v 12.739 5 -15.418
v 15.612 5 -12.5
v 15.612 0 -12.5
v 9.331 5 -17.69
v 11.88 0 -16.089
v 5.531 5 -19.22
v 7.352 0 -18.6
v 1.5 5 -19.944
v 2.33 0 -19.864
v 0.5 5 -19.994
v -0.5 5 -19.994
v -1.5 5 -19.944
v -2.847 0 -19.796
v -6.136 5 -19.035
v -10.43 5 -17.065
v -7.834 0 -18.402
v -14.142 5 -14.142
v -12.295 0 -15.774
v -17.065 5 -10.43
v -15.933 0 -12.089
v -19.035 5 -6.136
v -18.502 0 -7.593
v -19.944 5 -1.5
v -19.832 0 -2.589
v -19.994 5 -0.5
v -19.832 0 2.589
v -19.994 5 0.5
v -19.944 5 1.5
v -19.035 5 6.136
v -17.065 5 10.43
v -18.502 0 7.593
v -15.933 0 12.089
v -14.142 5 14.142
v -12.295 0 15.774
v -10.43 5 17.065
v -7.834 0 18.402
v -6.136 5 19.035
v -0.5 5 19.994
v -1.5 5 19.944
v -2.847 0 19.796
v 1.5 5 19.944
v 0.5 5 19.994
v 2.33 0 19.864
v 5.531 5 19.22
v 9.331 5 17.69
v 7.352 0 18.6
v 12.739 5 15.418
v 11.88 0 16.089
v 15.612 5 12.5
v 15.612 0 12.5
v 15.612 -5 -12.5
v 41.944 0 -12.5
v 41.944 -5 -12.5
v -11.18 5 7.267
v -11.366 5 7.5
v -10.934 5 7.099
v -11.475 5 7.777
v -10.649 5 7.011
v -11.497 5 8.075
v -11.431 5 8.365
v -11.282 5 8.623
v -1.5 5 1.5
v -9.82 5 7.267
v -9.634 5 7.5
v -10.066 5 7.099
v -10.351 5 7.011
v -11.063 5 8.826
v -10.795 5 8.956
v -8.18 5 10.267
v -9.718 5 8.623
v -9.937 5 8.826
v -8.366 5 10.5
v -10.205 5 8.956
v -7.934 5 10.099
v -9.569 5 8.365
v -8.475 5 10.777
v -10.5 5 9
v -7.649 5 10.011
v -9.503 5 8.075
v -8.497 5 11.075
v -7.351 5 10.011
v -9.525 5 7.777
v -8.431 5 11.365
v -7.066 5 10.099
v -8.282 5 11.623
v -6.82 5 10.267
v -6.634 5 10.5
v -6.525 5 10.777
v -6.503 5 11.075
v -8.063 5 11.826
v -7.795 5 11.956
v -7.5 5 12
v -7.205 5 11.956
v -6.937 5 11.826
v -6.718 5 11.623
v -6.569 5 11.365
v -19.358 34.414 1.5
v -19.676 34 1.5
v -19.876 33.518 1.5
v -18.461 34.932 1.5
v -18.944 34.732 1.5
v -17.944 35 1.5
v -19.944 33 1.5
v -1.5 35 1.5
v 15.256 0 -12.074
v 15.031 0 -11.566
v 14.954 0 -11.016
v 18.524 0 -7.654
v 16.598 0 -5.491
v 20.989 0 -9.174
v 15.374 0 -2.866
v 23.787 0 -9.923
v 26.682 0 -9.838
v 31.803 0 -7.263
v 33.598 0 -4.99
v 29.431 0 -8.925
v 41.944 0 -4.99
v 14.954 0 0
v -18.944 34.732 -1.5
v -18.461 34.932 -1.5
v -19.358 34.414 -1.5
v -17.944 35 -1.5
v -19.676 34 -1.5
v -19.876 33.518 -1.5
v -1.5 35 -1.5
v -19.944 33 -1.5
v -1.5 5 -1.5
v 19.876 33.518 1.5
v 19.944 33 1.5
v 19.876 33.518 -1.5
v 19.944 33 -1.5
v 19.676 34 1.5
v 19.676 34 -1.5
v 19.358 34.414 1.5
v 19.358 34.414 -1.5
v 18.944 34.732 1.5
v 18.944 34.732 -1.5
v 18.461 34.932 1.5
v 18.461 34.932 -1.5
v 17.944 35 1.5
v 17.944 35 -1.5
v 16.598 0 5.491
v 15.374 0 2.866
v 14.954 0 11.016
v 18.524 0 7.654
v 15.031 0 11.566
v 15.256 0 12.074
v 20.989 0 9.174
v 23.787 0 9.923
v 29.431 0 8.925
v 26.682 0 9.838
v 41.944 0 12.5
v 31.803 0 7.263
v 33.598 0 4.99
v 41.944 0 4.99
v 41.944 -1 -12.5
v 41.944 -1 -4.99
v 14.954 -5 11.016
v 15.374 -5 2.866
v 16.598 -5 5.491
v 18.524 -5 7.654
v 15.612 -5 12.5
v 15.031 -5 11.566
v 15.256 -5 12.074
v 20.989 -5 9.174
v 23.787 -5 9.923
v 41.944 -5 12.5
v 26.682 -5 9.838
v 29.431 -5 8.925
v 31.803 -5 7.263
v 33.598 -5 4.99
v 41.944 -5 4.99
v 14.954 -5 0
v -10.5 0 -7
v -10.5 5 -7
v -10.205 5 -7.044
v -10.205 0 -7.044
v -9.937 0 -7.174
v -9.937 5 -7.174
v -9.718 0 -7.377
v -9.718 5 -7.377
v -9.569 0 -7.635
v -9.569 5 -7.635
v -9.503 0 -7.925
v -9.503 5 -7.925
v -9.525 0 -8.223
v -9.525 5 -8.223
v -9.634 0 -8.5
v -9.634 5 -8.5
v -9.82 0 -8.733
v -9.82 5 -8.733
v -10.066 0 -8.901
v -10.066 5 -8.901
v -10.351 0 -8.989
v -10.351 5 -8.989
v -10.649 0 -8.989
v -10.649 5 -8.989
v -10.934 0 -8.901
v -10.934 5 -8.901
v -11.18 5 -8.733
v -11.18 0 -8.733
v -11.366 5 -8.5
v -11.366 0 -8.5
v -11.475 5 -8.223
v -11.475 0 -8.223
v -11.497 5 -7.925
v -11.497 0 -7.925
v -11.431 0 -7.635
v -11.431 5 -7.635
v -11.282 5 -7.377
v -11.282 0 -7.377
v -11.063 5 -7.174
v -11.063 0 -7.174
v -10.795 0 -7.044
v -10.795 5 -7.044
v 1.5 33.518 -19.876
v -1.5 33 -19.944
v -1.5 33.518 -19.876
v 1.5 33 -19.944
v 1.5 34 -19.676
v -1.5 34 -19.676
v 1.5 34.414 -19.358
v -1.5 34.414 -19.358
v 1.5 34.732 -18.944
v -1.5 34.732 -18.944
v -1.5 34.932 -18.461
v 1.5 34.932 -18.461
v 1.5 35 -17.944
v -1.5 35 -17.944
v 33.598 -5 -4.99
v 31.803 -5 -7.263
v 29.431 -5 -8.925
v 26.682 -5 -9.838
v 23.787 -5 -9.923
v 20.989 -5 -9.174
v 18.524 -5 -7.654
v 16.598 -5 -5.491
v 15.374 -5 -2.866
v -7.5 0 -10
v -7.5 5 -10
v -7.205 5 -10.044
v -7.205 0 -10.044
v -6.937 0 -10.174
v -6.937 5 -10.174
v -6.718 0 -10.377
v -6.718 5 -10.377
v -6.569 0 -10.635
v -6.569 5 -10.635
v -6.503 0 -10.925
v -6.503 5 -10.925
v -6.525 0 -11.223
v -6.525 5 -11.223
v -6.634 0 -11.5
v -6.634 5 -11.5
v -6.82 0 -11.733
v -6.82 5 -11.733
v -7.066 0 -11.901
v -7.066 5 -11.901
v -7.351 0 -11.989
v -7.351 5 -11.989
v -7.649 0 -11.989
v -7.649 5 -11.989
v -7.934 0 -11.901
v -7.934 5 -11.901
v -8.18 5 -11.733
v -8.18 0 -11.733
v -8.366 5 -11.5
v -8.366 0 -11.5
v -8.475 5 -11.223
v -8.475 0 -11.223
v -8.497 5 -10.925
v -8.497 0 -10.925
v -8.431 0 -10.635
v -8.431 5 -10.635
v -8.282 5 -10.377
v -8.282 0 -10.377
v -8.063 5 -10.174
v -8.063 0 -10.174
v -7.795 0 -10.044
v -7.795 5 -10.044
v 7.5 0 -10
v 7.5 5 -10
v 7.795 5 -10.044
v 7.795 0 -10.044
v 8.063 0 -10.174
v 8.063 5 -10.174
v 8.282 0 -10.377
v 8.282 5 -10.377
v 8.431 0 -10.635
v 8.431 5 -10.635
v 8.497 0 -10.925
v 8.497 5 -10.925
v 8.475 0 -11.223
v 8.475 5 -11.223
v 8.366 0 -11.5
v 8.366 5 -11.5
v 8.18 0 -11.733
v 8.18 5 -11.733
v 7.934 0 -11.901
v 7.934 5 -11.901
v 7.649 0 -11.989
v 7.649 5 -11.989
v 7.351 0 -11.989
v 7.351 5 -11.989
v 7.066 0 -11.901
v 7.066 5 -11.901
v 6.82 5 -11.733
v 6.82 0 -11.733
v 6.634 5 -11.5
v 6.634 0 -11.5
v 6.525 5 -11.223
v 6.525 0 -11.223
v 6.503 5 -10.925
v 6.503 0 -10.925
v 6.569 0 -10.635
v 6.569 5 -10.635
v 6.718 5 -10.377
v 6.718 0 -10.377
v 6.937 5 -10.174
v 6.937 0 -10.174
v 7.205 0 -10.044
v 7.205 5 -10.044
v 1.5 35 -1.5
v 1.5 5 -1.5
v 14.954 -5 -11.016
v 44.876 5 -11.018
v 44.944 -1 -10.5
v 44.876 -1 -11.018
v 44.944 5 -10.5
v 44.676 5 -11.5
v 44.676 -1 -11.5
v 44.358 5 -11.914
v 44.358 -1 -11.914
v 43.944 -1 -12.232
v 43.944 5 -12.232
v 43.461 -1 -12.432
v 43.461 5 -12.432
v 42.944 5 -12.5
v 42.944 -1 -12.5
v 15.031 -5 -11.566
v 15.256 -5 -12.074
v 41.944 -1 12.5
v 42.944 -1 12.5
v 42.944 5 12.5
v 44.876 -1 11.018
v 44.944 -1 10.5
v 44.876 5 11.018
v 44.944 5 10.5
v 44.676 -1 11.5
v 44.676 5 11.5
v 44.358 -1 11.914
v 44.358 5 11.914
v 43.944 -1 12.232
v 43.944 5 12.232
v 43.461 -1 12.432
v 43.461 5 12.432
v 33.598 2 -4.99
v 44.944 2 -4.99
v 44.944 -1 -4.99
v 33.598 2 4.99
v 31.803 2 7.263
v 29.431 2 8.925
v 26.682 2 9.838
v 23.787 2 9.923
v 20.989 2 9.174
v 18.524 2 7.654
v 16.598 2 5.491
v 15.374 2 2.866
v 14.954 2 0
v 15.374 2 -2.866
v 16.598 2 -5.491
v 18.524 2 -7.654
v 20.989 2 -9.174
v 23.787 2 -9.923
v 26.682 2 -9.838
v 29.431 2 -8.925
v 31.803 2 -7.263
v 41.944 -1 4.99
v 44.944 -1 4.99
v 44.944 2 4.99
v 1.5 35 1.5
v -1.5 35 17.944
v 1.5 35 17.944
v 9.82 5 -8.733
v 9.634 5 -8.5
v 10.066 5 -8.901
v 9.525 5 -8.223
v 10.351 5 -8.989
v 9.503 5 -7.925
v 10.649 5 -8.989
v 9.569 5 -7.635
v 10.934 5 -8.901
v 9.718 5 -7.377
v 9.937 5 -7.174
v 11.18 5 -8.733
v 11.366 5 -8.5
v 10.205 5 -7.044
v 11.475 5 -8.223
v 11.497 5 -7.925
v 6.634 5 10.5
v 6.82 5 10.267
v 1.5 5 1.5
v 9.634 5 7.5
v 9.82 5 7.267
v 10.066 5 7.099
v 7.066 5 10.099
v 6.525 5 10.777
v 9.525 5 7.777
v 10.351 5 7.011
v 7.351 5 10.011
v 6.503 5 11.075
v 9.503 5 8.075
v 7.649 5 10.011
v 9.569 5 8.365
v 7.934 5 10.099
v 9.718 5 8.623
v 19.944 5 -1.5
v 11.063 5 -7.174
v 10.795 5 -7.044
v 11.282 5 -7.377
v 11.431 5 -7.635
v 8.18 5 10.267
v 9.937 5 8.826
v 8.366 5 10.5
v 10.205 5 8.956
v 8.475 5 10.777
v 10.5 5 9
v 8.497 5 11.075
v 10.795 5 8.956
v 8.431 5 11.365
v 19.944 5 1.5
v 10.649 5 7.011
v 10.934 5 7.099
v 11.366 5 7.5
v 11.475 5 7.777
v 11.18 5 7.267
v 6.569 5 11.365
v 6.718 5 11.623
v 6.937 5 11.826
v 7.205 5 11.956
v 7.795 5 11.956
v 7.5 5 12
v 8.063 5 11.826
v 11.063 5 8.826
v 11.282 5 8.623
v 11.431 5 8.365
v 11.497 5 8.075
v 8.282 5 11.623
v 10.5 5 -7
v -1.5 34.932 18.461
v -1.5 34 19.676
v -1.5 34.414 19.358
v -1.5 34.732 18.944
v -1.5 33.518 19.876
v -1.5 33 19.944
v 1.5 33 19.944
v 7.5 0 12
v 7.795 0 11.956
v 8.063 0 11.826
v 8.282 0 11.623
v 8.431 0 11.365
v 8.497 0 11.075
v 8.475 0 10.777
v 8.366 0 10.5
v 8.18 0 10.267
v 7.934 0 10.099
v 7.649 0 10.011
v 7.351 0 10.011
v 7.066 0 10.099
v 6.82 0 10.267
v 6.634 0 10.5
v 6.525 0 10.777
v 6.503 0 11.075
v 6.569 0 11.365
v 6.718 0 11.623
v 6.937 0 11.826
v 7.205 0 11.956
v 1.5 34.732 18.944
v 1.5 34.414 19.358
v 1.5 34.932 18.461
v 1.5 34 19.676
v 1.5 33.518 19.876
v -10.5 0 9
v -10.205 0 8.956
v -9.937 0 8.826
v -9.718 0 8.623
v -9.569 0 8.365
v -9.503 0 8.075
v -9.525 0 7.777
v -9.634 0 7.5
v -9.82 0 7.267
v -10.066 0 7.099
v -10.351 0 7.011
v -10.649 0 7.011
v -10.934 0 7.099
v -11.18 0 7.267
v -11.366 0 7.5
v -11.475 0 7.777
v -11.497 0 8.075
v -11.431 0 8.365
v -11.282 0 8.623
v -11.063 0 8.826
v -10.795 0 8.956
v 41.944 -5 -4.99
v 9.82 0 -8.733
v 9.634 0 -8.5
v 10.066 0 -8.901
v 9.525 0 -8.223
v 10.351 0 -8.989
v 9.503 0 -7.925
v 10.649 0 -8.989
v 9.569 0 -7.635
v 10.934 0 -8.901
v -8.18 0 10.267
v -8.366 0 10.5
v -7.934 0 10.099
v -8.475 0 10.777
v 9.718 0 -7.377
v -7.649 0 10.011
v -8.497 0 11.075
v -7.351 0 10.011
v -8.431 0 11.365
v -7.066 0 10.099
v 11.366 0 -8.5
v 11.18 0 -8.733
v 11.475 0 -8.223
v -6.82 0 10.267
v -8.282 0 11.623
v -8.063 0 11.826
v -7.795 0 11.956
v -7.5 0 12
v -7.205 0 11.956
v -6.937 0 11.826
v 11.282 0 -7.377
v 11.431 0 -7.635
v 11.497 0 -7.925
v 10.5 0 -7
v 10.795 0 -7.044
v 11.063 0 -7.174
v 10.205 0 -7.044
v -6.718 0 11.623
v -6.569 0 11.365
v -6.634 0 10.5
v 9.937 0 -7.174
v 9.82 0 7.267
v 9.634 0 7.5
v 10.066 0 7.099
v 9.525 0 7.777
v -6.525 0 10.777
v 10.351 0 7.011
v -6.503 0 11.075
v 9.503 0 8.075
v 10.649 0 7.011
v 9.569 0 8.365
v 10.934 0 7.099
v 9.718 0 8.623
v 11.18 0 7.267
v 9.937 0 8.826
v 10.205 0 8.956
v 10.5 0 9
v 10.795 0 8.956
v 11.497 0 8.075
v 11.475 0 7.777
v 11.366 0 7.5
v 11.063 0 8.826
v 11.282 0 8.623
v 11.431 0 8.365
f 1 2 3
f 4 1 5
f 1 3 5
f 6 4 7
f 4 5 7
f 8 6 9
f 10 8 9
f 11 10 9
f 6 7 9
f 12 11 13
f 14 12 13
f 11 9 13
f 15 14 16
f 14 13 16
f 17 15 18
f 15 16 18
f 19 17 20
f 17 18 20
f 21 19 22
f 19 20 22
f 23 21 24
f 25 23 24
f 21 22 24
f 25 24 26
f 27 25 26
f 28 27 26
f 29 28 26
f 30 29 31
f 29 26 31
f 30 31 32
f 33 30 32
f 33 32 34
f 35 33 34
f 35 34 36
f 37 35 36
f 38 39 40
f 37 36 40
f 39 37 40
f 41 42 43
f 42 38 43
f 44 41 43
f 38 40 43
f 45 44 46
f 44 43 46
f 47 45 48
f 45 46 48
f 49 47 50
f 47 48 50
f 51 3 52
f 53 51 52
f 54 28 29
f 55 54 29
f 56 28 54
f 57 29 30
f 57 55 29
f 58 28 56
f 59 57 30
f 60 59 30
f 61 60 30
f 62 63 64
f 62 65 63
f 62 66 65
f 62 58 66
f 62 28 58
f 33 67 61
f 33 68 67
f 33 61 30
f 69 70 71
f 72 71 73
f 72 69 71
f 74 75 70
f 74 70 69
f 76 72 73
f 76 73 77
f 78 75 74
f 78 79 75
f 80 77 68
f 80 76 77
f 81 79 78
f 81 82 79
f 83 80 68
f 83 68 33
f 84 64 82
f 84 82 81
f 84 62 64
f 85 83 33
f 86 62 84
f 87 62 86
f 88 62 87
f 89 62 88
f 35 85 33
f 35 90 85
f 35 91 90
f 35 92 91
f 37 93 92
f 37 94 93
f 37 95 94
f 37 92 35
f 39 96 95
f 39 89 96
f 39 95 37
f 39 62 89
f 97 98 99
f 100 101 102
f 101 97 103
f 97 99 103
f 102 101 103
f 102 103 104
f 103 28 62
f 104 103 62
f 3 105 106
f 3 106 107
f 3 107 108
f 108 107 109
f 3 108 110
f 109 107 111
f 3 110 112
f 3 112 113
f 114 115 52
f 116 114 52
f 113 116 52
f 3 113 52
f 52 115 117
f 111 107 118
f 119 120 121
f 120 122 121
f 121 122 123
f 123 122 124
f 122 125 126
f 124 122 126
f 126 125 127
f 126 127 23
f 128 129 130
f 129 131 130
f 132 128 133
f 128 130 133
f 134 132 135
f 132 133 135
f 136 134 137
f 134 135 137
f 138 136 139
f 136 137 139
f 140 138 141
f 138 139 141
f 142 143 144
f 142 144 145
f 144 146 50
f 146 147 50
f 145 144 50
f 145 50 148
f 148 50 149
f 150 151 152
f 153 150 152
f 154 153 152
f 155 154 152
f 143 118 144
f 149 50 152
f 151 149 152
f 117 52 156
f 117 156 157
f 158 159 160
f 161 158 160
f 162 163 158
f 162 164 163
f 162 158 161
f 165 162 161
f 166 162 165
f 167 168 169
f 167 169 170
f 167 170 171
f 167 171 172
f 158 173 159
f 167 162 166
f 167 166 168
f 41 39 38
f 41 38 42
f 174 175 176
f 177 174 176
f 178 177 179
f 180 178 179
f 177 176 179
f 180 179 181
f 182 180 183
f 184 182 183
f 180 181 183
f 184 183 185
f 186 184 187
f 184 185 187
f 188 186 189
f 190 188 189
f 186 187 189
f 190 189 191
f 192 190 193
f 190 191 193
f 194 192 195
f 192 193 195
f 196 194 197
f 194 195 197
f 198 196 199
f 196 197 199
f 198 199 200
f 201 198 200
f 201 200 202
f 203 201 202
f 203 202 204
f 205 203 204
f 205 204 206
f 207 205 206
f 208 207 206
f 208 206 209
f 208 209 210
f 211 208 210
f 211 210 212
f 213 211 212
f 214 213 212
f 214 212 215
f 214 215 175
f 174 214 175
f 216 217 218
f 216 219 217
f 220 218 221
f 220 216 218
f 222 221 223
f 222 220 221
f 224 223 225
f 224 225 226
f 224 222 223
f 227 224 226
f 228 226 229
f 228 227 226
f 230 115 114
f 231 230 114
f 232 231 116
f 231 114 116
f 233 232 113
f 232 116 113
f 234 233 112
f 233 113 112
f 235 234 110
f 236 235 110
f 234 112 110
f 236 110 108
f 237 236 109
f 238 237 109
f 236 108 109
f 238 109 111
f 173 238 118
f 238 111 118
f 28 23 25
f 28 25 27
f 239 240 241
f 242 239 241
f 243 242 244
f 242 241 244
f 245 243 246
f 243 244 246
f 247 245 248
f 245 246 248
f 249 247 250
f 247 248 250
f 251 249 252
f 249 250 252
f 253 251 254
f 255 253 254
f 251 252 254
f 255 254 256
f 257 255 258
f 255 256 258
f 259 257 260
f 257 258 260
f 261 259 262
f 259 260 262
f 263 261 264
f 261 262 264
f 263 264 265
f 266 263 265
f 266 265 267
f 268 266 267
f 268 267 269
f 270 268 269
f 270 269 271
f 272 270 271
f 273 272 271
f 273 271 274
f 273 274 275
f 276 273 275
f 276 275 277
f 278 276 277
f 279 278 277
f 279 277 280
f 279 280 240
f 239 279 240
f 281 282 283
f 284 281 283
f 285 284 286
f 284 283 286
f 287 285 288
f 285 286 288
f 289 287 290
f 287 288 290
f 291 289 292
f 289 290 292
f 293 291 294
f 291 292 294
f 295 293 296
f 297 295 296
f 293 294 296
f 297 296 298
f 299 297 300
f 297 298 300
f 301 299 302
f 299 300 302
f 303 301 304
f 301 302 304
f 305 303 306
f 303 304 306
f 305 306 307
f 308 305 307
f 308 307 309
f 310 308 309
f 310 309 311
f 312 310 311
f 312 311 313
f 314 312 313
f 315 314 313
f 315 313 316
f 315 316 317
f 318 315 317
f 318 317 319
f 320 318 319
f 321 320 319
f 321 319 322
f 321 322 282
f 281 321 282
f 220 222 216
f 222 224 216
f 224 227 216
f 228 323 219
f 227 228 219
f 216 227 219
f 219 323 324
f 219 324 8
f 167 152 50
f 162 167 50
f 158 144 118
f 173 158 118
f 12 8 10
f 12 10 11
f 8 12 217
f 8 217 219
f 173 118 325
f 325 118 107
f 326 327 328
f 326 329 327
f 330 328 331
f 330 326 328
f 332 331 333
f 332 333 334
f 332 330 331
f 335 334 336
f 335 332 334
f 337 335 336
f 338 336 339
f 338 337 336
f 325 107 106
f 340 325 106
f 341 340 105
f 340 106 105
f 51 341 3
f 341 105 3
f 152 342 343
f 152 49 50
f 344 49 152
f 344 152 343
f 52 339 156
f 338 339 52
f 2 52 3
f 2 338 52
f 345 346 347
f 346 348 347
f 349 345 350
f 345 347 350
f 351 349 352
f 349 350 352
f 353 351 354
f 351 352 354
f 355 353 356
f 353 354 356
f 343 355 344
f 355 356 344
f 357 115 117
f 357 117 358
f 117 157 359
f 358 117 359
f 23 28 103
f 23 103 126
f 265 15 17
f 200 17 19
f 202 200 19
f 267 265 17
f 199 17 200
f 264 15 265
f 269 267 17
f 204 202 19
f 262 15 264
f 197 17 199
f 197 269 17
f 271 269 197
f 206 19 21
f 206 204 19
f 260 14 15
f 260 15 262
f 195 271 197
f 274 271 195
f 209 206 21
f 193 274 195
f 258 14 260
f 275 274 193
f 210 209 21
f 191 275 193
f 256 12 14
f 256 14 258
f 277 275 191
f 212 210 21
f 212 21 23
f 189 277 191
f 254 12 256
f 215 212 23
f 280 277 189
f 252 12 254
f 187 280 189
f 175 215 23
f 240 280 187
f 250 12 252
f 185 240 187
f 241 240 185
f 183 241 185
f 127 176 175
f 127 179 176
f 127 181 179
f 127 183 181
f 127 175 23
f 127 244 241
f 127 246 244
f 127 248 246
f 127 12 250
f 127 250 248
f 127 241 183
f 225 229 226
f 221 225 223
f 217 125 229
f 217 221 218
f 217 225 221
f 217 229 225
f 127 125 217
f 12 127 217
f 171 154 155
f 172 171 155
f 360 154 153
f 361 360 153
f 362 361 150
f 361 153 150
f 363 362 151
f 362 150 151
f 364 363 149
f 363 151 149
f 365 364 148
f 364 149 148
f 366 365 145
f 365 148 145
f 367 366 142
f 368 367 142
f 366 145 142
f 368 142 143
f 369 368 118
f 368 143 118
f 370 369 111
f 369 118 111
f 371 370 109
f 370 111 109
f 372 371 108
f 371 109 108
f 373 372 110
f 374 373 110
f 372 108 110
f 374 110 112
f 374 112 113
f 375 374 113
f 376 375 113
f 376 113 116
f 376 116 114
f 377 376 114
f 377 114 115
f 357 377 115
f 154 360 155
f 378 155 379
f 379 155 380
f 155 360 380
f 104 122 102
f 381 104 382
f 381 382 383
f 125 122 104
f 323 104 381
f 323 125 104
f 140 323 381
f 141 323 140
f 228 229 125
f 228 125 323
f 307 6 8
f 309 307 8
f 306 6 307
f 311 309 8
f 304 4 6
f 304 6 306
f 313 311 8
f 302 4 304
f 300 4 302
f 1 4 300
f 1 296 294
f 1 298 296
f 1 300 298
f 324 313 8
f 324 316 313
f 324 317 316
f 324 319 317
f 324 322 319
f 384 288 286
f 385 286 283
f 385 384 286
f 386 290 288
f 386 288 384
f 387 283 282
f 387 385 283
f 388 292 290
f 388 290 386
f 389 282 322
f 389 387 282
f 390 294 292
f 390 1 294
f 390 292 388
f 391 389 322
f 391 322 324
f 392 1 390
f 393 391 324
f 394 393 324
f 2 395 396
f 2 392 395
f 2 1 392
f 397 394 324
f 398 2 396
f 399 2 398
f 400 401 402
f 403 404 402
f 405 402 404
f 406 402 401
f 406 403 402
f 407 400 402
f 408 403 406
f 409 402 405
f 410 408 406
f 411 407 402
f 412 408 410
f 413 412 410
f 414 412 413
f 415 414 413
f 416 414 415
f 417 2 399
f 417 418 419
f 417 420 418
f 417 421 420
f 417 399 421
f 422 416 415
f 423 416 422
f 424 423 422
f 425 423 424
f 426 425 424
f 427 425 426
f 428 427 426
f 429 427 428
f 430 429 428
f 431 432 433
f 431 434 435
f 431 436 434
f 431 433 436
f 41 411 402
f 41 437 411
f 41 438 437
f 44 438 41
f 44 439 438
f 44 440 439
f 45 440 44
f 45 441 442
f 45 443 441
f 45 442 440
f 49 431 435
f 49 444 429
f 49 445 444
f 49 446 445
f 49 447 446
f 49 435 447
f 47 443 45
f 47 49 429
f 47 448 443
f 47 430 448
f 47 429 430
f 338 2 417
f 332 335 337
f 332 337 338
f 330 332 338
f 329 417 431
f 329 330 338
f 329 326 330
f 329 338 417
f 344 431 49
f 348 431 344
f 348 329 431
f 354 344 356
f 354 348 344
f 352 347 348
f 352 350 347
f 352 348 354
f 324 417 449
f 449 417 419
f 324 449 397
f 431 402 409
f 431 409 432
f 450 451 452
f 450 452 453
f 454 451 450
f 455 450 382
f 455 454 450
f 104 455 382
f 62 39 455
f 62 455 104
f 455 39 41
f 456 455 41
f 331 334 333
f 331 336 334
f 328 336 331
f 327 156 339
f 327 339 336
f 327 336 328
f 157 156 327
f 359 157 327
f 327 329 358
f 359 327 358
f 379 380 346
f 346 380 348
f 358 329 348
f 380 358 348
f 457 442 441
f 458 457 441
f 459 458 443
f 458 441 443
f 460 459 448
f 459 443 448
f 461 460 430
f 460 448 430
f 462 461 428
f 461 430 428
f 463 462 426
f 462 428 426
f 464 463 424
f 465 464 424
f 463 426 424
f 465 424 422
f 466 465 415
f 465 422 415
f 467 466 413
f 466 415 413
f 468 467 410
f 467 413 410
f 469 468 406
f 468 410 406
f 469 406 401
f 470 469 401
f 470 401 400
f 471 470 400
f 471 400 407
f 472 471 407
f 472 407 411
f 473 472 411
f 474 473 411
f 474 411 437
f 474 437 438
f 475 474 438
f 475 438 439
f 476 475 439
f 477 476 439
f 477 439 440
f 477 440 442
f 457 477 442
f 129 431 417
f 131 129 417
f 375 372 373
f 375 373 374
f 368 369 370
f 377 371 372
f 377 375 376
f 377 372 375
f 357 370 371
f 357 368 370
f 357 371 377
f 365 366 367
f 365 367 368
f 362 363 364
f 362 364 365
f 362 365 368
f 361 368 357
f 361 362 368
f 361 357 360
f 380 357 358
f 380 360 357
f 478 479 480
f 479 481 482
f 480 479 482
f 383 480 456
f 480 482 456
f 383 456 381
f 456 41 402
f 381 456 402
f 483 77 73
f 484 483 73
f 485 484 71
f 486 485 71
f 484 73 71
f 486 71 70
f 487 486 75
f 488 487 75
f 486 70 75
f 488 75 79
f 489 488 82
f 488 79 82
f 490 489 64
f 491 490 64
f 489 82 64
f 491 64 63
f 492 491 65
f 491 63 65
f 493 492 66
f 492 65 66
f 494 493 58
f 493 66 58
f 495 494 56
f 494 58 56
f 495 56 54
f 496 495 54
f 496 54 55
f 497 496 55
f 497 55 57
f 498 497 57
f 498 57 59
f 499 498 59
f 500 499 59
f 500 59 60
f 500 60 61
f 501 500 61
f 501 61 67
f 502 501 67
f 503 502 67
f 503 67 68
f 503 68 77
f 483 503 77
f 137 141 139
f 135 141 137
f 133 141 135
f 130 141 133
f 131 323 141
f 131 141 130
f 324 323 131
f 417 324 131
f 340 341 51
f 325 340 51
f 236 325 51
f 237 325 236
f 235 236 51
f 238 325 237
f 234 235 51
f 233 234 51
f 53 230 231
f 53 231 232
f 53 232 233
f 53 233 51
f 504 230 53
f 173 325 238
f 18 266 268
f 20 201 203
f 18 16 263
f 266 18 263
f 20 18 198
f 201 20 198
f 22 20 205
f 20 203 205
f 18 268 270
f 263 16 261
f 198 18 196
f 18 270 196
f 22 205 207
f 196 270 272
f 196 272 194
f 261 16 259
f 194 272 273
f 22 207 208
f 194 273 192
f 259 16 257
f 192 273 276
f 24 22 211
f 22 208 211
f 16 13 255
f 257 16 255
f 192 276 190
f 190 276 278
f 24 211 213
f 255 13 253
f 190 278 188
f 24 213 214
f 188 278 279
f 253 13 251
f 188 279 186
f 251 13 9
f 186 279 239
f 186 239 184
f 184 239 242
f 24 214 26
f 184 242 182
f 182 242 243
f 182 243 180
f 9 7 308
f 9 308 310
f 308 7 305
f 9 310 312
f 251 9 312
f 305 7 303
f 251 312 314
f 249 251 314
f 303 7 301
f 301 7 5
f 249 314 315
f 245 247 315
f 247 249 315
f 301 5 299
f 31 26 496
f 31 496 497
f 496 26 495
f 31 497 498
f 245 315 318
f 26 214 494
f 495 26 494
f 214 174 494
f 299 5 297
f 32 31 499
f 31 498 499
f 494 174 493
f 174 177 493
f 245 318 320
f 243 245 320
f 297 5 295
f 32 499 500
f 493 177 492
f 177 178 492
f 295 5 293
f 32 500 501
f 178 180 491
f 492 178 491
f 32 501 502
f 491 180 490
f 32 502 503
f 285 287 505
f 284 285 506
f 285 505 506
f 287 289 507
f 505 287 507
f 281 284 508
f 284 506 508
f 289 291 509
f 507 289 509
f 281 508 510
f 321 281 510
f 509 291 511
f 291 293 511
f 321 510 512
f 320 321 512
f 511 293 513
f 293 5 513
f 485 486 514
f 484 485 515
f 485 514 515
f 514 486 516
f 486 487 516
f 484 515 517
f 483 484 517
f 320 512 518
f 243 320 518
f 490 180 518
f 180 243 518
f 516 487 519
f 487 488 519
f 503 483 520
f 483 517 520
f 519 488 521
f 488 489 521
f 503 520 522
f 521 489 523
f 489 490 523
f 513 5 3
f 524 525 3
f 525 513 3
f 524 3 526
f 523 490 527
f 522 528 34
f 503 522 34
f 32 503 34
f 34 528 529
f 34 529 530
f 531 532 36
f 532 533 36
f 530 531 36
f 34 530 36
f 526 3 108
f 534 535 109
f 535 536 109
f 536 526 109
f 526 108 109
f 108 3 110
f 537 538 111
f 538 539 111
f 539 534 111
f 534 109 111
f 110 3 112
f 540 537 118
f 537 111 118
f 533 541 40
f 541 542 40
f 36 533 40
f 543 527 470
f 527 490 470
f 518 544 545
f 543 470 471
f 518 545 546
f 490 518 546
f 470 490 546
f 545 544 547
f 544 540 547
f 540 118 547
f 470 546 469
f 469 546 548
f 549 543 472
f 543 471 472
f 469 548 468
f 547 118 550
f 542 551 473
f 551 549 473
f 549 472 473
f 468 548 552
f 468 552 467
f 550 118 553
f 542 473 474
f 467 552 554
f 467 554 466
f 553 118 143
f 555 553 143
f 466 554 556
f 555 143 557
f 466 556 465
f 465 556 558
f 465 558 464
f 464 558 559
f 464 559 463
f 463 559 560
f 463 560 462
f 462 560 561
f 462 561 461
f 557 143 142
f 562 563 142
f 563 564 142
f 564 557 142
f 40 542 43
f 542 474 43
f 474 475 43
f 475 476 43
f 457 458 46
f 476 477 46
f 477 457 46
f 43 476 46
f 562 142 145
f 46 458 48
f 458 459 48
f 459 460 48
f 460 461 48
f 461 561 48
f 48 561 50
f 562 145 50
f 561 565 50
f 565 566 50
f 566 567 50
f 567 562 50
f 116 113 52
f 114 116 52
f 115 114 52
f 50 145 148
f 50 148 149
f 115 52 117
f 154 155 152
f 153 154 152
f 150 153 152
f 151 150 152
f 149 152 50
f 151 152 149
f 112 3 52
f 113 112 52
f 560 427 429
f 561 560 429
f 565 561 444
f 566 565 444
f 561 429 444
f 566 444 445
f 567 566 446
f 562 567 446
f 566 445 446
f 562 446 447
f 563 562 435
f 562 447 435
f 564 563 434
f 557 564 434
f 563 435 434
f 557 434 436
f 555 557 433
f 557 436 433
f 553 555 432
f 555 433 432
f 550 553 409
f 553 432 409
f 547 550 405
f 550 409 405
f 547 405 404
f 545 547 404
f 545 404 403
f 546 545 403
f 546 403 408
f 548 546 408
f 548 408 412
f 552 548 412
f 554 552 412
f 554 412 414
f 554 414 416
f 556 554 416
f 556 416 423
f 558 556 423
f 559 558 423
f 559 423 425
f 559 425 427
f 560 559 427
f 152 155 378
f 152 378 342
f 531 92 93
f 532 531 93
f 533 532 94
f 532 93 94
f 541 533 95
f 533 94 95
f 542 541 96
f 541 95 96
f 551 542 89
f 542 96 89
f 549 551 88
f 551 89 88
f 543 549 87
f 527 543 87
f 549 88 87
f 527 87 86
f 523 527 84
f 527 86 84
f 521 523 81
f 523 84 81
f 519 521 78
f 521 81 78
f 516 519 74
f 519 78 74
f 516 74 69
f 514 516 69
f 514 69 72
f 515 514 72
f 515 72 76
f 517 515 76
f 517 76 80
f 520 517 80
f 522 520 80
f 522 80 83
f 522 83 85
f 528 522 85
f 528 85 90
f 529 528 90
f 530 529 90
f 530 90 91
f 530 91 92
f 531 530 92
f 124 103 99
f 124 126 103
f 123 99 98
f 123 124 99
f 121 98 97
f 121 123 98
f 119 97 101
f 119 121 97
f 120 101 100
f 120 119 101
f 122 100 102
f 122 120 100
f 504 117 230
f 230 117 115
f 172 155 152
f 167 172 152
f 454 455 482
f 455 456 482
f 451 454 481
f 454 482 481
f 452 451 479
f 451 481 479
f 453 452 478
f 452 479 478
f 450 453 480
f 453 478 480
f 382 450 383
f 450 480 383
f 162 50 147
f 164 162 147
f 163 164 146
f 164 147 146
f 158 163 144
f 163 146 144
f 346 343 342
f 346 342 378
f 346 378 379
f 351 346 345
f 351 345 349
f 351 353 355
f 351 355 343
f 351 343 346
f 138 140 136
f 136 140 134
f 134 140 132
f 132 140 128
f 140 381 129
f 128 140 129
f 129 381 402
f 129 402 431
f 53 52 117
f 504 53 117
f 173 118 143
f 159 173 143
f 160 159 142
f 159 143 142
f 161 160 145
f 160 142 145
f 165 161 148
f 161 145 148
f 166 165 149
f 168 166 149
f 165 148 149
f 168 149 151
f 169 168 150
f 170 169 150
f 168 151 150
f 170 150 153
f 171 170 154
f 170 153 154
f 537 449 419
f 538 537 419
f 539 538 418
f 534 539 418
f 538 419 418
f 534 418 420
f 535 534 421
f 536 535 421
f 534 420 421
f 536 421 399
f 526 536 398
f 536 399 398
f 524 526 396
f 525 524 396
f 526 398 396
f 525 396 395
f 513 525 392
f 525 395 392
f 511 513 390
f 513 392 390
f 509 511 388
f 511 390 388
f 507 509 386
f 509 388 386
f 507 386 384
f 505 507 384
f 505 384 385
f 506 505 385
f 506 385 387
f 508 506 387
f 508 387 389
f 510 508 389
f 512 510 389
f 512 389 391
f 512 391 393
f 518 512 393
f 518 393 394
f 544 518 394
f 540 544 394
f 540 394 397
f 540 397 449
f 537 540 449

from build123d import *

# Parameters (mm, degrees)
SKETCH1_R             = 20
BOSS_EXTRUDE1_DEPTH   = 5
SKETCH2_W             = 18.443670675
SKETCH2_H             = 3
SKETCH2_W_2           = 3
SKETCH2_H_2           = 18.443670675
BOSS_EXTRUDE2_DEPTH   = 30
BOSS_EXTRUDE3_DEPTH   = 5
CUT_EXTRUDE1_DEPTH    = 2
SKETCH5_R             = 1
CUT_EXTRUDE3_DEPTH    = 58.618864391
FILLET1_R             = 2
SKETCH7_W             = 3
SKETCH7_H             = 7.51
BOSS_EXTRUDE4_DEPTH   = 1
BOSS_EXTRUDE6_DEPTH   = 5
BOSS_EXTRUDE6_2_DEPTH = 5
FILLET2_R             = 2
FILLET3_R             = 2
FILLET4_R             = 2


with BuildPart() as part:
    # Sketch1 → Boss-Extrude1 (new body)
    with BuildSketch(Plane(origin=(0, 0, 0), x_dir=(1, 0, 0), z_dir=(0, 1, 0))):
        with Locations(Location((0, 0, 0), (0, 0, 270))):
            Circle(SKETCH1_R)
    extrude(amount=BOSS_EXTRUDE1_DEPTH)

    # Sketch2 → Boss-Extrude2 (add)
    with BuildSketch(Plane(origin=(0, 5, 0), x_dir=(1, 0, 0), z_dir=(0, 1, 0))):
        with Locations((-10.721835337, 0)):
            Rectangle(SKETCH2_W, SKETCH2_H)
        Rectangle(SKETCH2_W_2, SKETCH2_H)
        with Locations((0, -10.721835337)):
            Rectangle(SKETCH2_W_2, SKETCH2_H_2)
        with Locations((0, 10.721835337)):
            Rectangle(SKETCH2_W_2, SKETCH2_H_2)
        with Locations((10.721835337, 0)):
            Rectangle(SKETCH2_W, SKETCH2_H)
    extrude(amount=BOSS_EXTRUDE2_DEPTH)

    # Sketch3 → Boss-Extrude3 (add)
    with BuildSketch(Plane(origin=(0, 5, 0), x_dir=(1, 0, 0), z_dir=(0, 1, 0))):
        Polygon((-5.056329325, 12.5), (-5.056329325, -12.5), (15.612494996, -12.5), (44.943670675, -12.5), (44.943670675, 12.5), align=None)
    extrude(amount=-BOSS_EXTRUDE3_DEPTH)

    # Sketch4 → Cut-Extrude1 (cut)
    with BuildSketch(Plane.XZ):
        with BuildLine():
            ThreePointArc((33.598149285, 4.99), (14.953670675, 0), (33.598149285, -4.99))
            Line((33.598149285, -4.99), (24.943670675, -4.99))
            Line((24.943670675, -4.99), (24.943670675, 4.99))
            Line((24.943670675, 4.99), (33.598149285, 4.99))
        make_face()
        with BuildLine():
            Line((24.943670675, -4.99), (33.598149285, -4.99))
            ThreePointArc((33.598149285, -4.99), (34.594016299, -2.58281423), (34.933670675, 0))
            ThreePointArc((34.933670675, 0), (34.594016299, 2.58281423), (33.598149285, 4.99))
            Line((33.598149285, 4.99), (24.943670675, 4.99))
            Line((24.943670675, 4.99), (24.943670675, -4.99))
        make_face()
        with BuildLine():
            Line((33.598149285, -4.99), (44.943670675, -4.99))
            Line((44.943670675, -4.99), (44.943670675, 4.99))
            Line((44.943670675, 4.99), (33.598149285, 4.99))
            ThreePointArc((33.598149285, 4.99), (34.594016299, 2.58281423), (34.933670675, 0))
            ThreePointArc((34.933670675, 0), (34.594016299, -2.58281423), (33.598149285, -4.99))
        make_face()
        with BuildLine():
            ThreePointArc((33.598149285, 4.99), (14.953670675, 0), (33.598149285, -4.99))
            Line((33.598149285, -4.99), (24.943670675, -4.99))
            Line((24.943670675, -4.99), (24.943670675, 4.99))
            Line((24.943670675, 4.99), (33.598149285, 4.99))
        make_face()
        with BuildLine():
            Line((24.943670675, -4.99), (33.598149285, -4.99))
            ThreePointArc((33.598149285, -4.99), (34.594016299, -2.58281423), (34.933670675, 0))
            ThreePointArc((34.933670675, 0), (34.594016299, 2.58281423), (33.598149285, 4.99))
            Line((33.598149285, 4.99), (24.943670675, 4.99))
            Line((24.943670675, 4.99), (24.943670675, -4.99))
        make_face()
    extrude(amount=-CUT_EXTRUDE1_DEPTH, mode=Mode.SUBTRACT)

    # Sketch5 → Cut-Extrude3 (cut, through all)
    with BuildSketch(Plane(origin=(0, 5, 0), x_dir=(1, 0, 0), z_dir=(0, 1, 0))):
        with Locations(Location((-10.5, 8, 0), (0, 0, 270))):
            Circle(SKETCH5_R)
        with Locations(Location((-7.5, 11, 0), (0, 0, 270))):
            Circle(SKETCH5_R)
        with Locations(Location((7.5, 11, 0), (0, 0, 270))):
            Circle(SKETCH5_R)
        with Locations(Location((10.5, 8, 0), (0, 0, 270))):
            Circle(SKETCH5_R)
        with Locations(Location((-10.5, -8, 0), (0, 0, 270))):
            Circle(SKETCH5_R)
        with Locations(Location((-7.5, -11, 0), (0, 0, 270))):
            Circle(SKETCH5_R)
        with Locations(Location((10.5, -8, 0), (0, 0, 270))):
            Circle(SKETCH5_R)
        with Locations(Location((7.5, -11, 0), (0, 0, 270))):
            Circle(SKETCH5_R)
    extrude(amount=-CUT_EXTRUDE3_DEPTH, mode=Mode.SUBTRACT)

    # Fillet1
    fillet1_edges = [part.edges().sort_by_distance(p)[0] for p in [
        (19.943670675, 35, 0),
        (0, 35, -19.943670675),
        (-19.943670675, 35, 0),
        (0, 35, 19.943670675),
    ]]
    fillet(fillet1_edges, radius=FILLET1_R)

    # Sketch7 → Boss-Extrude4 (add)
    with BuildSketch(Plane.XZ):
        with Locations((43.443670675, 8.745)):
            Rectangle(SKETCH7_W, SKETCH7_H)
        with Locations((43.443670675, -8.745)):
            Rectangle(SKETCH7_W, SKETCH7_H)
    extrude(amount=BOSS_EXTRUDE4_DEPTH)

    # Fillet4
    fillet4_edges = [part.edges().sort_by_distance(p)[0] for p in [
        (44.943670675, 2, 12.5),
        (44.943670675, 2, -12.5),
    ]]
    fillet(fillet4_edges, radius=FILLET4_R)


with BuildPart() as body_2:
    # Sketch8 → Boss-Extrude6 (new body)
    with BuildSketch(Plane.XZ):
        with BuildLine():
            Line((14.953670675, 13.281104372), (14.953670675, 0))
            ThreePointArc((14.953670675, 0), (22.360856445, 9.650345624), (33.598149285, 4.99))
            Line((33.598149285, 4.99), (41.943670675, 4.99))
            Line((41.943670675, 4.99), (41.943670675, 12.5))
            Line((41.943670675, 12.5), (15.612494996, 12.5))
            ThreePointArc((15.612494996, 12.5), (15.288072212, 12.894760488), (14.953670675, 13.281104372))
        make_face()
    extrude(amount=BOSS_EXTRUDE6_DEPTH)

    # Fillet2
    # the kernel refuses this fillet: 2 mm, written as the material it takes off along each edge
    with BuildSketch(Plane(origin=(14.953670675, 5.661911606, 13.281104372), x_dir=(0, 0, -1), z_dir=(0, -1, 0))) as fillet2_piece_1:
        with BuildLine():
            CenterArc((2.264764642, 2), FILLET2_R, 222.112450768, 47.887549232)
            ThreePointArc((0.781104372, 0.658824321), (0.386343884, 0.334401537), (0, 0))
            Line((0, 0), (2.264764642, 0))
        make_face()
    extrude(amount=16.323823211, mode=Mode.SUBTRACT)


with BuildPart() as body_3:
    # Sketch8 → Boss-Extrude6 2 (new body)
    with BuildSketch(Plane.XZ):
        with BuildLine():
            Line((41.943670675, -4.99), (33.598149285, -4.99))
            ThreePointArc((33.598149285, -4.99), (22.360856445, -9.650345624), (14.953670675, 0))
            Line((14.953670675, 0), (14.953670675, -13.281104372))
            ThreePointArc((14.953670675, -13.281104372), (15.288072212, -12.894760488), (15.612494996, -12.5))
            Line((15.612494996, -12.5), (41.943670675, -12.5))
            Line((41.943670675, -12.5), (41.943670675, -4.99))
        make_face()
    extrude(amount=BOSS_EXTRUDE6_2_DEPTH)

    # Fillet3
    # the kernel refuses this fillet: 2 mm, written as the material it takes off along each edge
    with BuildSketch(Plane(origin=(14.953670675, 5.661911606, -13.281104372), x_dir=(0, 0, 1), z_dir=(0, -1, 0))) as fillet3_piece_1:
        with BuildLine():
            CenterArc((2.264764642, -2), FILLET3_R, 90, 47.887549232)
            ThreePointArc((0.781104372, -0.658824321), (0.386343884, -0.334401537), (0, 0))
            Line((0, 0), (2.264764642, 0))
        make_face()
    extrude(amount=16.323823211, mode=Mode.SUBTRACT)


solid = Compound([part.part, body_2.part, body_3.part])
